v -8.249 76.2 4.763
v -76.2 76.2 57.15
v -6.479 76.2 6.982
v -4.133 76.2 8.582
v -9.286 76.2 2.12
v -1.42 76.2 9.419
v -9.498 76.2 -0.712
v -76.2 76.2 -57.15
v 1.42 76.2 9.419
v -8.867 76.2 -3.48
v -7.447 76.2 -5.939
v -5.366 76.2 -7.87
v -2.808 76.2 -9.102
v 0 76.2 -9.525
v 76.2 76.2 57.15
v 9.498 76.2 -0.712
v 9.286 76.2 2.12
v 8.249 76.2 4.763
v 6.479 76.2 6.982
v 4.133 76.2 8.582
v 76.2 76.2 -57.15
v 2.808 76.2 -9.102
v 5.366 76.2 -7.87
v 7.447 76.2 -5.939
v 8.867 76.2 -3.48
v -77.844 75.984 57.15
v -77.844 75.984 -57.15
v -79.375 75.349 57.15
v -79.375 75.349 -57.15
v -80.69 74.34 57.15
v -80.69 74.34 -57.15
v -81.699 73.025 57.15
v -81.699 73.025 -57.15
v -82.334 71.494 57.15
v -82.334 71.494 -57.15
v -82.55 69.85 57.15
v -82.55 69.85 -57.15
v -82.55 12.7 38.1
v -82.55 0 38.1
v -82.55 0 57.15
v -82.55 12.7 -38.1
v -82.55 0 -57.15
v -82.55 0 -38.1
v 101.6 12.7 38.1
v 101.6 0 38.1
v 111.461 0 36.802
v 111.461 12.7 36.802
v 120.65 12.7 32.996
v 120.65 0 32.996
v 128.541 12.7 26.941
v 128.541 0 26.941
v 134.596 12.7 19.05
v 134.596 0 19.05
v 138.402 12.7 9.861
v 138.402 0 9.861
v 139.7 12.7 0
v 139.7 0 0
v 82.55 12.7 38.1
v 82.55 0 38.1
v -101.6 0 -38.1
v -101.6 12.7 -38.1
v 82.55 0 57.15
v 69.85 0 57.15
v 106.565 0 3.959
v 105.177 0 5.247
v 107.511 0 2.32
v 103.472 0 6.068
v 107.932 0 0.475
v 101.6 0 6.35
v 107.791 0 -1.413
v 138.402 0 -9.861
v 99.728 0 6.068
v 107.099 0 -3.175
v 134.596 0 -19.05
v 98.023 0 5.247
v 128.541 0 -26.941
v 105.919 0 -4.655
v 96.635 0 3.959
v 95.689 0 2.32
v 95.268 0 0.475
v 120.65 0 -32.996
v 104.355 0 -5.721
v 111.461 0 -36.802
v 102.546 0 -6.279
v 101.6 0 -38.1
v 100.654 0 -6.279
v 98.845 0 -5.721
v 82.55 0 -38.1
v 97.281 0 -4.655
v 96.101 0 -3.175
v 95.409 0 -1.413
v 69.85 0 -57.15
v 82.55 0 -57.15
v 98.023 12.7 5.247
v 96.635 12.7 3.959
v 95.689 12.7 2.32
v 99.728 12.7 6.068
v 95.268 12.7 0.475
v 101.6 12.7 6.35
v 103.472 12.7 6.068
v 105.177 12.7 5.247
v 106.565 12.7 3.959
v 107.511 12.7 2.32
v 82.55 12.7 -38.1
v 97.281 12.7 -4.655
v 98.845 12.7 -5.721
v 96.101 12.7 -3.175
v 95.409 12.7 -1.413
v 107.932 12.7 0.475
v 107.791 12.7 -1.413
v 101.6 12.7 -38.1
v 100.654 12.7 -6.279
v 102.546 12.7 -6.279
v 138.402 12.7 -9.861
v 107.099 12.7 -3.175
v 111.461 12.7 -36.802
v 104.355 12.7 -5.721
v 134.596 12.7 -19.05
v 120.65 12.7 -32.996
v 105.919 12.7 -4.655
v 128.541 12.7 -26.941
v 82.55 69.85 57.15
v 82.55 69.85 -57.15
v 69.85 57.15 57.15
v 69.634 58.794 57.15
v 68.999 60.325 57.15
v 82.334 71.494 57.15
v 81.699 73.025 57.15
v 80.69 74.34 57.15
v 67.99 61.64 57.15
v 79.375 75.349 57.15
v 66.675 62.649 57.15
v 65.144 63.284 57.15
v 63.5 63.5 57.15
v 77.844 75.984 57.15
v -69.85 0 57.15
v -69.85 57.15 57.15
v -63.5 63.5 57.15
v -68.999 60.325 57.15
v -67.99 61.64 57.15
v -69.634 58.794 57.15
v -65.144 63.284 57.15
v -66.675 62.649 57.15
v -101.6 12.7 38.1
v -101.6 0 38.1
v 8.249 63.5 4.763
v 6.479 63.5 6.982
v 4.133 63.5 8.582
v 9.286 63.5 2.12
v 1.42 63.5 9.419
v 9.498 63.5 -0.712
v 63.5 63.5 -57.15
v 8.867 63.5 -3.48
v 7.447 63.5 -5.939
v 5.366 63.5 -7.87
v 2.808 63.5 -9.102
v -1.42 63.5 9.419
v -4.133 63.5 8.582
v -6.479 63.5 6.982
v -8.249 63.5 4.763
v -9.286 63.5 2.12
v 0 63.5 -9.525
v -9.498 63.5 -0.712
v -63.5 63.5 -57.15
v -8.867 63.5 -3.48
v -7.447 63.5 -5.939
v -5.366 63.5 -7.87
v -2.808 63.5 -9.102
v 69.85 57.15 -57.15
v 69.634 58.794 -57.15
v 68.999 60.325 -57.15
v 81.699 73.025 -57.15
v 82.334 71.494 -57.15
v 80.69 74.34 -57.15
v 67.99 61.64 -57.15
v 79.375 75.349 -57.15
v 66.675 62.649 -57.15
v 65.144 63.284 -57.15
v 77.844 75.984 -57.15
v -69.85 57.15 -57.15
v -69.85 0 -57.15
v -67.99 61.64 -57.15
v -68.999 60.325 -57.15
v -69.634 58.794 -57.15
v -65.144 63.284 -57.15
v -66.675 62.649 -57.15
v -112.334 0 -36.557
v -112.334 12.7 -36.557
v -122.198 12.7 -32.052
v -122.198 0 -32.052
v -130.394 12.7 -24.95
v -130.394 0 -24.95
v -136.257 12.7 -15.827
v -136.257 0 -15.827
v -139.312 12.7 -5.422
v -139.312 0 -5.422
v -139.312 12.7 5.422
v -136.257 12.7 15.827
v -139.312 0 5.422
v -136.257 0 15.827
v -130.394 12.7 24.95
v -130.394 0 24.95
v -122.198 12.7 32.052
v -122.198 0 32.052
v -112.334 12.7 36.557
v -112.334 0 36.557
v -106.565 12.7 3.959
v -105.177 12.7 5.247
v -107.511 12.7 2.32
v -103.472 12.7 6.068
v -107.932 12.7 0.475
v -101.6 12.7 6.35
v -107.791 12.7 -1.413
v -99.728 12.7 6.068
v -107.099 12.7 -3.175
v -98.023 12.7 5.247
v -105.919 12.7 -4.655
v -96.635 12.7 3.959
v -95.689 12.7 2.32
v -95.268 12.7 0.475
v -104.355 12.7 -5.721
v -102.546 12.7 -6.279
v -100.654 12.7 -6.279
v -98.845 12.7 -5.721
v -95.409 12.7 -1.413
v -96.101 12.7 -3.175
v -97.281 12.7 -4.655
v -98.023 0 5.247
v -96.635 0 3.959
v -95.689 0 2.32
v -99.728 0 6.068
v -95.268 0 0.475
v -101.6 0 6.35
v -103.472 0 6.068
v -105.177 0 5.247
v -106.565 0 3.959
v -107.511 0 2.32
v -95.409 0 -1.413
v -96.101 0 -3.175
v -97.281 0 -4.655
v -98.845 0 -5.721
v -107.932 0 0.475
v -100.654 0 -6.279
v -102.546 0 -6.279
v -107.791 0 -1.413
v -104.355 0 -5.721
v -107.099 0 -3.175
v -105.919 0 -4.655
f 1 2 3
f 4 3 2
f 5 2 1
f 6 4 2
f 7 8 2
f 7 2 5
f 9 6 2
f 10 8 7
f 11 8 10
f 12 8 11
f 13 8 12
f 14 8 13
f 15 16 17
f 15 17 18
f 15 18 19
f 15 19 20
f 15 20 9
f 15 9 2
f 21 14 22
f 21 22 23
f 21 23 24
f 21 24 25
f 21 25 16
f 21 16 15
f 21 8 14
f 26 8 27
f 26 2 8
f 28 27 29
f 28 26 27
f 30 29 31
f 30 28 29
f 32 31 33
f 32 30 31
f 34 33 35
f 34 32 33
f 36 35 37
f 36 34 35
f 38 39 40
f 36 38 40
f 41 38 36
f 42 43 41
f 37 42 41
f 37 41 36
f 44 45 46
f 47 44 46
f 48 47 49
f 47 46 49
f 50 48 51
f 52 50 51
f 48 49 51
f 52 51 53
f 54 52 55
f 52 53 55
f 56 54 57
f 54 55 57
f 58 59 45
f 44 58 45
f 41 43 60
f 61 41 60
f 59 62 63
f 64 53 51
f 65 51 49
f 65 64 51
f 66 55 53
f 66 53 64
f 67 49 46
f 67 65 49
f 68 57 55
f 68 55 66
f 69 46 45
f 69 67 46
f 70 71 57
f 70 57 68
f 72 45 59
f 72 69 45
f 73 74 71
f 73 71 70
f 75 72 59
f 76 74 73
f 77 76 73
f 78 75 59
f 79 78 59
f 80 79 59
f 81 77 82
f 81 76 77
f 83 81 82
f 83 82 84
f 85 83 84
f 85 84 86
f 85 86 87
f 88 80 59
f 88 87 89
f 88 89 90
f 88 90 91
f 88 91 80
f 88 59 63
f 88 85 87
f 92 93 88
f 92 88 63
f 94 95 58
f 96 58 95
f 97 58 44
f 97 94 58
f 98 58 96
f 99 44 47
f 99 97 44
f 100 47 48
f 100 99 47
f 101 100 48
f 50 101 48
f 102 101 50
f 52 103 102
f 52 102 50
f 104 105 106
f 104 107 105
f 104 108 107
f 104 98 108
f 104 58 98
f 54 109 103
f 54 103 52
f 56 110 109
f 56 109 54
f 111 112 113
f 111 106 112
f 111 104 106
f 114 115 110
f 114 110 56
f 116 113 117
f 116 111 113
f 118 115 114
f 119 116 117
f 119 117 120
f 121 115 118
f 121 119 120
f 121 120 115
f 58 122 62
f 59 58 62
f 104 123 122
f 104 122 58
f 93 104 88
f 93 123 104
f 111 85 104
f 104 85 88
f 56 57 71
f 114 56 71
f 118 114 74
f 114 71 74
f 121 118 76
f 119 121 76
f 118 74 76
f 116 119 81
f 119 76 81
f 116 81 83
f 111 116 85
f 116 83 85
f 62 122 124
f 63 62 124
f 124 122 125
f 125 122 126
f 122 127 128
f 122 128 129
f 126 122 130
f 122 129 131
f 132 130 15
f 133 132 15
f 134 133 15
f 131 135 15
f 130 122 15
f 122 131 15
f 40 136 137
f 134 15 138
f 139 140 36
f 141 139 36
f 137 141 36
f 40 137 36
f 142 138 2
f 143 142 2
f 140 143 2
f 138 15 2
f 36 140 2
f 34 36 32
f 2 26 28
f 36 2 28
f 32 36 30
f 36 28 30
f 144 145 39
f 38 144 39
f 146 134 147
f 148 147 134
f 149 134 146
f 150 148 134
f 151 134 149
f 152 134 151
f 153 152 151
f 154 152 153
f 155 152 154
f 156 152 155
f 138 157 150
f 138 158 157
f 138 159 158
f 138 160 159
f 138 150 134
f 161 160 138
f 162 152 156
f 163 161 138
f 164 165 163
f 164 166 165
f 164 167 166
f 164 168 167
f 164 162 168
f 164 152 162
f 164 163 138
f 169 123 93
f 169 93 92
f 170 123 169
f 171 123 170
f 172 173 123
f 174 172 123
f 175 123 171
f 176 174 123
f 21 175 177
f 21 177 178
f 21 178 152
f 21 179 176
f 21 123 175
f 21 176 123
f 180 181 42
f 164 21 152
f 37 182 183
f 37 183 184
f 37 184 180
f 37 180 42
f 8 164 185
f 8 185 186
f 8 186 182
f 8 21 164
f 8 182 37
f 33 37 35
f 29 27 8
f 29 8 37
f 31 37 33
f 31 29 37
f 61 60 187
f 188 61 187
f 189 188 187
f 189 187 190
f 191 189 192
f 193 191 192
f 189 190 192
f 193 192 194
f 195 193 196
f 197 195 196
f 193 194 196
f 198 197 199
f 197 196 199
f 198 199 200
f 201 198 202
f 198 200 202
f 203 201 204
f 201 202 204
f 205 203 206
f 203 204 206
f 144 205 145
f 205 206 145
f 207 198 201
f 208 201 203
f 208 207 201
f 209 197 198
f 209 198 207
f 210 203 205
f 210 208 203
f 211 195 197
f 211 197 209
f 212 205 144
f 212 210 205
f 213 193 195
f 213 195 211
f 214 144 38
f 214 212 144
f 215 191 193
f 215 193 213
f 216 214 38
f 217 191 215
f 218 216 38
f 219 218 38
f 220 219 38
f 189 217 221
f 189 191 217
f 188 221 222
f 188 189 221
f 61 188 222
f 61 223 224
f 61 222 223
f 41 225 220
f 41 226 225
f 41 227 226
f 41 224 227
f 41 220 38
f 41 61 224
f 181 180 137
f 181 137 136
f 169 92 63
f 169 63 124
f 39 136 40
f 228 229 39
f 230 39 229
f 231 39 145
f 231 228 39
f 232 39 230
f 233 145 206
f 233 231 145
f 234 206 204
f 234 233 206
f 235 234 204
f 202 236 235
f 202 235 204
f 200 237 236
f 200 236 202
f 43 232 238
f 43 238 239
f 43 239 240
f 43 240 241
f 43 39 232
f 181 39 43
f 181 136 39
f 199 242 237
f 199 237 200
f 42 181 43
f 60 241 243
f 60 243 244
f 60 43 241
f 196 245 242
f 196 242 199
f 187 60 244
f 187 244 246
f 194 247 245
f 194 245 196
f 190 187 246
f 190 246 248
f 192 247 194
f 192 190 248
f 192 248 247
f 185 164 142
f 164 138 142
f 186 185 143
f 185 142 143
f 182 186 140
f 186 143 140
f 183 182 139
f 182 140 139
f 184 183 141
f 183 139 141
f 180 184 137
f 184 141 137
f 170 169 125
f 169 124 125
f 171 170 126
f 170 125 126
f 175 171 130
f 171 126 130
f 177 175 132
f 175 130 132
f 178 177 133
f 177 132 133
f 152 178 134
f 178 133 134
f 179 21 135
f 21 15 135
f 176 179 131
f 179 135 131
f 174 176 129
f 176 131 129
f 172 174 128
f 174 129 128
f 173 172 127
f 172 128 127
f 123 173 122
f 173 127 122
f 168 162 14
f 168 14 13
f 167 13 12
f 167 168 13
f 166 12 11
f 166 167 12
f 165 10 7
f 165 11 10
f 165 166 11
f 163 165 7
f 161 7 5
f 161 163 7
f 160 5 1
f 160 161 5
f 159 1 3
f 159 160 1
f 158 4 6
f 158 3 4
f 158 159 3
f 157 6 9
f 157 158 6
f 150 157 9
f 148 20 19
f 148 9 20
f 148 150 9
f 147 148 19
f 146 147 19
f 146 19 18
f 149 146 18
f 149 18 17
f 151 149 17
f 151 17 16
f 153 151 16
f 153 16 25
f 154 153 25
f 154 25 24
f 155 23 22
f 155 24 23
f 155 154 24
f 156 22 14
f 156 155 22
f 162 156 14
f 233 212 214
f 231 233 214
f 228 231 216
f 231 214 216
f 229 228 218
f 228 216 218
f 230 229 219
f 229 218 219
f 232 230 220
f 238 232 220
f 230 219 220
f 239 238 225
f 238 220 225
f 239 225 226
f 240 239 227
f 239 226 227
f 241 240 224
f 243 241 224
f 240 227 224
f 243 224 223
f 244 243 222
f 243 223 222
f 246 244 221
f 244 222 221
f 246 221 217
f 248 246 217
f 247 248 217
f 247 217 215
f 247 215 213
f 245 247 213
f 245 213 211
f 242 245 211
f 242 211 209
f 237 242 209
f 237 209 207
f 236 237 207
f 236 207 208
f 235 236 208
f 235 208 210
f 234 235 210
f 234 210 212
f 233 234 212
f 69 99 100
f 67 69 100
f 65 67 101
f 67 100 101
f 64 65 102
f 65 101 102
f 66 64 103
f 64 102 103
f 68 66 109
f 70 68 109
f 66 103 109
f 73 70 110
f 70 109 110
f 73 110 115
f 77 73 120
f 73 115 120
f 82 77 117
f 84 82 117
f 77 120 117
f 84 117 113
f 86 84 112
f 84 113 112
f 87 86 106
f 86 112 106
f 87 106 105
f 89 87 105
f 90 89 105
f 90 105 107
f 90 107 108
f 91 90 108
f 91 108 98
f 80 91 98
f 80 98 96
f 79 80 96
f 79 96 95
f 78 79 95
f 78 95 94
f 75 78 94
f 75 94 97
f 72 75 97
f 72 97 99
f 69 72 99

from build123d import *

# Parameters (mm, degrees)
BOSS_EXTRUDE1_DEPTH      = 12.7
BOSS_EXTRUDE2_DEPTH      = 57.15
BOSS_EXTRUDE2_DEPTH_BACK = 57.15
SKETCH8_R                = 9.525
CUT_EXTRUDE2_DEPTH       = 170.081792337
SKETCH9_W                = 139.7
SKETCH9_H                = 63.5
CUT_EXTRUDE3_DEPTH       = 196.926057481
FILLET1_R                = 6.35
SKETCH10_R               = 6.35
CUT_EXTRUDE4_DEPTH       = 164.751221369


with BuildPart() as part:
    # Sketch1 → Boss-Extrude1 (new body)
    with BuildSketch(Plane(origin=(0, 0, 0), x_dir=(1, 0, 0), z_dir=(0, 1, 0))):
        with BuildLine():
            Line((101.6, 38.1), (-101.6, 38.1))
            ThreePointArc((-101.6, 38.1), (-74.659231637, 26.940768363), (-63.5, 0))
            ThreePointArc((-63.5, 0), (-74.659231637, -26.940768363), (-101.6, -38.1))
            Line((-101.6, -38.1), (101.6, -38.1))
            ThreePointArc((101.6, -38.1), (63.5, 0), (101.6, 38.1))
        make_face()
        with BuildLine():
            ThreePointArc((-63.5, 0), (-74.659231637, 26.940768363), (-101.6, 38.1))
            Line((-101.6, 38.1), (-101.6, -38.1))
            ThreePointArc((-101.6, -38.1), (-74.659231637, -26.940768363), (-63.5, 0))
        make_face()
        with BuildLine():
            Line((-101.6, -38.1), (-101.6, 38.1))
            ThreePointArc((-101.6, 38.1), (-139.7, 0), (-101.6, -38.1))
        make_face()
        with BuildLine():
            ThreePointArc((139.7, 0), (128.540768363, 26.940768363), (101.6, 38.1))
            Line((101.6, 38.1), (101.6, -38.1))
            ThreePointArc((101.6, -38.1), (128.540768363, -26.940768363), (139.7, 0))
        make_face()
        with BuildLine():
            Line((101.6, -38.1), (101.6, 38.1))
            ThreePointArc((101.6, 38.1), (63.5, 0), (101.6, -38.1))
        make_face()
    extrude(amount=BOSS_EXTRUDE1_DEPTH)

    # Sketch2 → Boss-Extrude2 (add, two sides: drawn at the far end of the back side and taken through both)
    with BuildSketch(Plane.XY.offset(-BOSS_EXTRUDE2_DEPTH_BACK)):
        Polygon((69.85, 0), (69.85, 63.5), (-69.85, 63.5), (-69.85, 0), (-82.55, 0), (-82.55, 76.2), (82.55, 76.2), (82.55, 0), align=None)
    extrude(amount=BOSS_EXTRUDE2_DEPTH + BOSS_EXTRUDE2_DEPTH_BACK)

    # Sketch8 → Cut-Extrude2 (cut, through all)
    with BuildSketch(Plane(origin=(0, 0, 0), x_dir=(1, 0, 0), z_dir=(0, 1, 0))):
        with Locations(Location((0, 0, 0), (0, 0, 90))):
            Circle(SKETCH8_R)
    extrude(amount=CUT_EXTRUDE2_DEPTH, mode=Mode.SUBTRACT)

    # Sketch9 → Cut-Extrude3 (cut, through all)
    with BuildSketch(Plane.XY.offset(57.15)):
        with Locations((0, 31.75)):
            Rectangle(SKETCH9_W, SKETCH9_H)
    extrude(amount=-CUT_EXTRUDE3_DEPTH, mode=Mode.SUBTRACT)

    # Fillet1
    fillet1_edges = [part.edges().sort_by_distance(p)[0] for p in [
        (-69.85, 63.5, 0),
        (82.55, 76.2, 0),
        (69.85, 63.5, 0),
        (-82.55, 76.2, 0),
    ]]
    fillet(fillet1_edges, radius=FILLET1_R)

    # Sketch10 → Cut-Extrude4 (cut, through all)
    with BuildSketch(Plane(origin=(0, 12.7, 0), x_dir=(1, 0, 0), z_dir=(0, 1, 0))):
        with Locations(Location((101.6, 0, 0), (0, 0, 270))):
            Circle(SKETCH10_R)
        with Locations(Location((-101.6, 0, 0), (0, 0, 270))):
            Circle(SKETCH10_R)
    extrude(amount=-CUT_EXTRUDE4_DEPTH, mode=Mode.SUBTRACT)


solid = part.part
